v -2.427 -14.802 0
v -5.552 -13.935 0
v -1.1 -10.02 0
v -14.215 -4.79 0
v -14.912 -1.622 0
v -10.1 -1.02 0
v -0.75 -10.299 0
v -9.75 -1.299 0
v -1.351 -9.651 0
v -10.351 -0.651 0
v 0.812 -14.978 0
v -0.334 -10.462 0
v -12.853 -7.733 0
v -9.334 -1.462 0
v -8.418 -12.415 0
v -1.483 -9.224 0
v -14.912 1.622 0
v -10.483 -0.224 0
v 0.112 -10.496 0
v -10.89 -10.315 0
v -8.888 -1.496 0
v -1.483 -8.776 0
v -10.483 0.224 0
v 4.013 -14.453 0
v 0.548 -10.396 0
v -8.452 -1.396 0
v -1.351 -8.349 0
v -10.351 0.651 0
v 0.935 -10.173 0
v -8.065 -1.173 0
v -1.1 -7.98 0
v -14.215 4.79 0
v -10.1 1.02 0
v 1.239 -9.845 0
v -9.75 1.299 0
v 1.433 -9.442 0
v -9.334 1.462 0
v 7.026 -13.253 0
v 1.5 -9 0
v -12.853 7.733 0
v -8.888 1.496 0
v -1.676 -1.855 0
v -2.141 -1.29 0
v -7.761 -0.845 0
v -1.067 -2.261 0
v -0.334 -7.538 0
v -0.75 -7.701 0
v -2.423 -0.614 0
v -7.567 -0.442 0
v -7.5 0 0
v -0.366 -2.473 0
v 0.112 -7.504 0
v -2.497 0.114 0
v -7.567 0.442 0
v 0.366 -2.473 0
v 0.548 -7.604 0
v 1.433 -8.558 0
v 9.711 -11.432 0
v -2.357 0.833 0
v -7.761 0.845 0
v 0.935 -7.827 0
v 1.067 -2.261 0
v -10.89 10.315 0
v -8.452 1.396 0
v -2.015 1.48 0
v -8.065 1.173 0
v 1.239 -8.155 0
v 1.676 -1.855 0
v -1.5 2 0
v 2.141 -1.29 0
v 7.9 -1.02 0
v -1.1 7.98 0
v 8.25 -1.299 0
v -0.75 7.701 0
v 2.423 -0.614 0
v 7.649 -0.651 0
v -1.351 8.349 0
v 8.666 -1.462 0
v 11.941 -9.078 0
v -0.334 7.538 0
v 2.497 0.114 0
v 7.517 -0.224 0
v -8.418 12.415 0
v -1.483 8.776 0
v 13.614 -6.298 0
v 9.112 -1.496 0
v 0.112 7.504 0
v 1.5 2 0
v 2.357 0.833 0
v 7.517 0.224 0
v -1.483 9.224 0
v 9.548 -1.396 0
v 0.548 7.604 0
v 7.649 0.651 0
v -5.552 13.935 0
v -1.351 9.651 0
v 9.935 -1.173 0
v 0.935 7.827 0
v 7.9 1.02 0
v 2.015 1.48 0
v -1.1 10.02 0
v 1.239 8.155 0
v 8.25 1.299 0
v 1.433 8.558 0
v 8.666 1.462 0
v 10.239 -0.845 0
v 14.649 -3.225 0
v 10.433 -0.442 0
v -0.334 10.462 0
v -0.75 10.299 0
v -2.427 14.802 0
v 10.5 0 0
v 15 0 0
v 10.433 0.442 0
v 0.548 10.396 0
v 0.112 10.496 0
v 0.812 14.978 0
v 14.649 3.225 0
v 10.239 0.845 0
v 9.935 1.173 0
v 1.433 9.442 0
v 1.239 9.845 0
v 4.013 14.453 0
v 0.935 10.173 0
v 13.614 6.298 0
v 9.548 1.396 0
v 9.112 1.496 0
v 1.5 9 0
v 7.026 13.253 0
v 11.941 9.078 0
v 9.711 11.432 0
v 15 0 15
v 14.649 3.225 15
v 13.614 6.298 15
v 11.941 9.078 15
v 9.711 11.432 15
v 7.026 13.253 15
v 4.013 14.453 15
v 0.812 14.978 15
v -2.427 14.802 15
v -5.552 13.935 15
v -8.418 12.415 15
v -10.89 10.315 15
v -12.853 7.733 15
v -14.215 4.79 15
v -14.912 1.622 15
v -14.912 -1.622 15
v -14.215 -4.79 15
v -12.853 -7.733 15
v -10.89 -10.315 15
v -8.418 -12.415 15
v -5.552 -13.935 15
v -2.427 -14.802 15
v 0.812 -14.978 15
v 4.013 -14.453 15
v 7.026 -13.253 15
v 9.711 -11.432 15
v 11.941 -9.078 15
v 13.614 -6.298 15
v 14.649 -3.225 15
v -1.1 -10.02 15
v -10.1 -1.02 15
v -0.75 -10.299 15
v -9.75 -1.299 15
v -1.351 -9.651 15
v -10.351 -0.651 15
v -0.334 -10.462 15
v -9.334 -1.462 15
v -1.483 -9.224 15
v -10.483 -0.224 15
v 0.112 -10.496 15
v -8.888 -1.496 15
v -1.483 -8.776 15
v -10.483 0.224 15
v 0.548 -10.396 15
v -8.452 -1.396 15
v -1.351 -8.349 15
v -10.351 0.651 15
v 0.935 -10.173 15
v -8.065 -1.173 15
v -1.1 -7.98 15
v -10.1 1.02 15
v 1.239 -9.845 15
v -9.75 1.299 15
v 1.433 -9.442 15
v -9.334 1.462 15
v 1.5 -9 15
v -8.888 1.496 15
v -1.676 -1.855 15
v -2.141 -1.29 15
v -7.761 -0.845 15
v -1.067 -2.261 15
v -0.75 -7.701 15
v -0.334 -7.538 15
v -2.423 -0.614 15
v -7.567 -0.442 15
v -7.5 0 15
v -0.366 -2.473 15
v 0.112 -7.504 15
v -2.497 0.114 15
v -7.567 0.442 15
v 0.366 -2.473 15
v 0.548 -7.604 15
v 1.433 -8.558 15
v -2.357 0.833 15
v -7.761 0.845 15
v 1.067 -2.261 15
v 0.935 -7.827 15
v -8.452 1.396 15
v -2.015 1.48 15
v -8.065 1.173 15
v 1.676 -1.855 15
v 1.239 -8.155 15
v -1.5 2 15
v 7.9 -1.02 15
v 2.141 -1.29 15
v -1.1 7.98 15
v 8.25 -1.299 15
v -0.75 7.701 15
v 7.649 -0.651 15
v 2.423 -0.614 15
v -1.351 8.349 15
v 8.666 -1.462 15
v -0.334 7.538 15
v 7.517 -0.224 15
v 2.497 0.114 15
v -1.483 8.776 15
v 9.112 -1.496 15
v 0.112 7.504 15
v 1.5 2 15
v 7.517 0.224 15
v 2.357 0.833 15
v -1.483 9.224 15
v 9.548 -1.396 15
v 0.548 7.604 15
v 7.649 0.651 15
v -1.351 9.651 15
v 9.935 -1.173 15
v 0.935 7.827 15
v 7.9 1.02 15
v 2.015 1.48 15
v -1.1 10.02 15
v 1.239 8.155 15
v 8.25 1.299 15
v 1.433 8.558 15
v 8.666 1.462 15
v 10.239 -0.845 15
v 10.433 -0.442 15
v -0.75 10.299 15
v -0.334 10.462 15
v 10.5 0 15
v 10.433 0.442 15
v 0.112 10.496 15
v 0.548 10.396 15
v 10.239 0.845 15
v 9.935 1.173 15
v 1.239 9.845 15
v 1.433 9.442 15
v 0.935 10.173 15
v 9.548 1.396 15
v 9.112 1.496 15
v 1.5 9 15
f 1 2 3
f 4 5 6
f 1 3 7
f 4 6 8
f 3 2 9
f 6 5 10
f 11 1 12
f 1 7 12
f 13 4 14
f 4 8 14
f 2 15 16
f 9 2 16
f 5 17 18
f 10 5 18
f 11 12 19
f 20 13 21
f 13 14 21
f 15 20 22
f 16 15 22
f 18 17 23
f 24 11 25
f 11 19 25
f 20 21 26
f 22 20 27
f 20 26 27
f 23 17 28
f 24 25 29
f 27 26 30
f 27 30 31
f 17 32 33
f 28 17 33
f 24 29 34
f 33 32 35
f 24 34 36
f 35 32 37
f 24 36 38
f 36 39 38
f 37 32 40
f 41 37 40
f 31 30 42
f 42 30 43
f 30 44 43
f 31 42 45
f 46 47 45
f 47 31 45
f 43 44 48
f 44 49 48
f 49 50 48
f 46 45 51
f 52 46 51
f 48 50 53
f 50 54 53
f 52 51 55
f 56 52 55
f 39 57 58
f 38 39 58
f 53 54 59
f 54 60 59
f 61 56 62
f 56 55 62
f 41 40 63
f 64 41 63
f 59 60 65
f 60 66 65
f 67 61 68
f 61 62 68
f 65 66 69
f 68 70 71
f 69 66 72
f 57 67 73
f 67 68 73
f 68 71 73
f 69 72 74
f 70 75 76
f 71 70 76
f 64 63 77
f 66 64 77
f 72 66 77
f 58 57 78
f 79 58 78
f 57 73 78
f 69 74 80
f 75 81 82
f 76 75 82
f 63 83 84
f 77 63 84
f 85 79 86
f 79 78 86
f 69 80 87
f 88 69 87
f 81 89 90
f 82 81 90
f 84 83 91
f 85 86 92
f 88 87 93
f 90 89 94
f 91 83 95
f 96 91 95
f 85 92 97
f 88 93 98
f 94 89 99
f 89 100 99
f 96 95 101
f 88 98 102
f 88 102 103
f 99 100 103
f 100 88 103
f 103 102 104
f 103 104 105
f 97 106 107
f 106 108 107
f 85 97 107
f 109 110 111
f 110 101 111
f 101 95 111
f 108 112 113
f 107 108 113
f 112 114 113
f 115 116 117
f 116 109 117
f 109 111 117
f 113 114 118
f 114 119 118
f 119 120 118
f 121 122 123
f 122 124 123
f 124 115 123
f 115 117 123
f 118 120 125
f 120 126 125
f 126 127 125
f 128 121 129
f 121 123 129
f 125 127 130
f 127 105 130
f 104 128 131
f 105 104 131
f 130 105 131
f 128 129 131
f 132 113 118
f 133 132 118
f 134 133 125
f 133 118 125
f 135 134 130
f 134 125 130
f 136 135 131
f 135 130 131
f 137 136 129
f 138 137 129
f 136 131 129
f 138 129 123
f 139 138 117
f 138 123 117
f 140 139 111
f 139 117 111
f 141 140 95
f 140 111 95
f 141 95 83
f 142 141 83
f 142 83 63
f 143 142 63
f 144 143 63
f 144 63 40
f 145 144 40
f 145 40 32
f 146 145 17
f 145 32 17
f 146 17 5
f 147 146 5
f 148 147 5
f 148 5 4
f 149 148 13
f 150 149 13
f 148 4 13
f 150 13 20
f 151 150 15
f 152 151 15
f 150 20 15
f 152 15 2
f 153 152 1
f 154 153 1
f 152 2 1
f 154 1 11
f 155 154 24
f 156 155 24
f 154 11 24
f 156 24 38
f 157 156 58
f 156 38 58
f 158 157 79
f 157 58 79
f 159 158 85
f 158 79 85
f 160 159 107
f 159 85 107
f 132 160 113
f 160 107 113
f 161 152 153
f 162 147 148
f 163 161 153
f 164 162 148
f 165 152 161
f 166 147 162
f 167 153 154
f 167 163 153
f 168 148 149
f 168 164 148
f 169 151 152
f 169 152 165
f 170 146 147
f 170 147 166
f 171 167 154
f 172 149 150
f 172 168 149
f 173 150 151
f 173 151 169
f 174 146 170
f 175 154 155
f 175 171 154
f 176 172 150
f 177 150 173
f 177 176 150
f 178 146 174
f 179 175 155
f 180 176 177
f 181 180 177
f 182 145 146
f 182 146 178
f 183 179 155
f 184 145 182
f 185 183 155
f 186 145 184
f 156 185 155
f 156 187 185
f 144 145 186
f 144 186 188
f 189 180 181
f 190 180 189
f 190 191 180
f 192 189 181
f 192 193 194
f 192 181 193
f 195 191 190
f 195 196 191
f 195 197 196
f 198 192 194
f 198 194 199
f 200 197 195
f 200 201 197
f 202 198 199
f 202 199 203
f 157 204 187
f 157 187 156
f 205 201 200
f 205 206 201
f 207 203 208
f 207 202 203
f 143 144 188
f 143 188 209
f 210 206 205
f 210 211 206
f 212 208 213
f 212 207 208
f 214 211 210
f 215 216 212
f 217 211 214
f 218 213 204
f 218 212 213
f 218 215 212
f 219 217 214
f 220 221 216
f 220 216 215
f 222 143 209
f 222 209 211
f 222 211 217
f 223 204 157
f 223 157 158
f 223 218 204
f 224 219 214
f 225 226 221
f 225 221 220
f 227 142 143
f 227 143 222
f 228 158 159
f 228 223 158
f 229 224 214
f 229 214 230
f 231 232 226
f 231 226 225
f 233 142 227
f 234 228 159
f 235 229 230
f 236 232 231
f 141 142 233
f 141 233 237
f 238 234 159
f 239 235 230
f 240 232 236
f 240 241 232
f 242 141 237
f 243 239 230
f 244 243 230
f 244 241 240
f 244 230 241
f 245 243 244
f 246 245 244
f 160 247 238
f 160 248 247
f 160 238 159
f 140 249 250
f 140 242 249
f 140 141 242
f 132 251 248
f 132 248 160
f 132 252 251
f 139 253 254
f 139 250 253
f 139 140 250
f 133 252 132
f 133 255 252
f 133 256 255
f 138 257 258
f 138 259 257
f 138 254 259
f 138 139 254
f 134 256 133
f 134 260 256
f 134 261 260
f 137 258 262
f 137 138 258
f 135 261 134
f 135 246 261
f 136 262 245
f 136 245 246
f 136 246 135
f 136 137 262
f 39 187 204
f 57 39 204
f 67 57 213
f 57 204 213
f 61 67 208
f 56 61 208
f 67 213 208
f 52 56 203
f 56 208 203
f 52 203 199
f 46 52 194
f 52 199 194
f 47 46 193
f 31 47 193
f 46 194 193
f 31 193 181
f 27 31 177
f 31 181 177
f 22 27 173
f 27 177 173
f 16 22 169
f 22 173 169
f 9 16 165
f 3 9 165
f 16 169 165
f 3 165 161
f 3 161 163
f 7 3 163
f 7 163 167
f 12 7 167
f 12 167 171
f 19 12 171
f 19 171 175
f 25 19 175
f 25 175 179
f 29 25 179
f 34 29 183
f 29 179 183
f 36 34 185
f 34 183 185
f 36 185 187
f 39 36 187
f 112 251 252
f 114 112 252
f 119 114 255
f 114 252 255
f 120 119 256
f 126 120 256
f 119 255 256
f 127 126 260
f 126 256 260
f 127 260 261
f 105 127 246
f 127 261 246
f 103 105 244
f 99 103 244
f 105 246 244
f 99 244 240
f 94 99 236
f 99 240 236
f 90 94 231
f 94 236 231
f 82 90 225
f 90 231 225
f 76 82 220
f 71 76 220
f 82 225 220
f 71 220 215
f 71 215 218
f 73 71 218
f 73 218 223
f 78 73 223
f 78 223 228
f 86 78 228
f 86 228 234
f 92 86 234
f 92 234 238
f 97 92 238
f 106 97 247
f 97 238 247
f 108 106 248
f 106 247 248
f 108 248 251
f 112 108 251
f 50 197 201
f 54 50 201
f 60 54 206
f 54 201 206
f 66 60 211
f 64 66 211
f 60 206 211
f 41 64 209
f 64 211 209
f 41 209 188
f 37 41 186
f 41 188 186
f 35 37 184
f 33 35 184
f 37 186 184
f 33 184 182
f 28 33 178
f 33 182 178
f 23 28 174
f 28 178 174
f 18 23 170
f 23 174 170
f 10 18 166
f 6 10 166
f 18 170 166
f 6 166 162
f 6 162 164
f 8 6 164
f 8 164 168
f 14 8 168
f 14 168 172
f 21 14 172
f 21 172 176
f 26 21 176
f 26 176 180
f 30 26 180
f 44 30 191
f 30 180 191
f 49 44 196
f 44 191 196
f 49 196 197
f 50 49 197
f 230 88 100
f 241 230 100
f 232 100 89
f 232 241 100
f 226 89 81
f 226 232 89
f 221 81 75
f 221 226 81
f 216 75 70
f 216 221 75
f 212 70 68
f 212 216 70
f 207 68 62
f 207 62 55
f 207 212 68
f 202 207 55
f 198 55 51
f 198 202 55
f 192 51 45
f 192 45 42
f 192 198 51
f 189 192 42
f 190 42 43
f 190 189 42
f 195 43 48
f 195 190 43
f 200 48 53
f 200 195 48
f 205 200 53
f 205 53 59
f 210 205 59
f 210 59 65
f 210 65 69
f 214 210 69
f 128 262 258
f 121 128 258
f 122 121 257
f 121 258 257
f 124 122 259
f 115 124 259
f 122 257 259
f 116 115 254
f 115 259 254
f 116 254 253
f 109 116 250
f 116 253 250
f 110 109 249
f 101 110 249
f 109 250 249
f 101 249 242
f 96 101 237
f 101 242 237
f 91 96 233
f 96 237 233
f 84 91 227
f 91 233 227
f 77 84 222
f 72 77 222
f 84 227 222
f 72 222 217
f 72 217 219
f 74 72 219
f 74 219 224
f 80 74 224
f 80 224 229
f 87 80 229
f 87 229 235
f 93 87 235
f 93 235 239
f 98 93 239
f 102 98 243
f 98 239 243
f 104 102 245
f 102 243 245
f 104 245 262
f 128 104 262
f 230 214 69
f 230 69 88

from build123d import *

# Parameters (mm, degrees)
SKETCH1_R           = 15
BOSS_EXTRUDE1_DEPTH = 15
CUT_EXTRUDE1_DEPTH  = 15
SKETCH3_R           = 1.5
CUT_EXTRUDE2_DEPTH  = 15


with BuildPart() as part:
    # Sketch1 → Boss-Extrude1 (new body)
    with BuildSketch(Plane.XY):
        Circle(SKETCH1_R)
    extrude(amount=BOSS_EXTRUDE1_DEPTH)

    # Sketch2 → Cut-Extrude1 (cut)
    with BuildSketch(Plane.XY.offset(15)):
        with BuildLine():
            Line((-1.5, 2), (1.5, 2))
            ThreePointArc((1.5, 2), (0, -2.5), (-1.5, 2))
        make_face()
    extrude(amount=-CUT_EXTRUDE1_DEPTH, mode=Mode.SUBTRACT)

    # Sketch3 → Cut-Extrude2 (cut)
    with BuildSketch(Plane.XY.offset(15)):
        with Locations((0, 9)):
            Circle(SKETCH3_R)
        with Locations((9, 0)):
            Circle(SKETCH3_R)
        with Locations((0, -9)):
            Circle(SKETCH3_R)
        with Locations((-9, 0)):
            Circle(SKETCH3_R)
    extrude(amount=-CUT_EXTRUDE2_DEPTH, mode=Mode.SUBTRACT)


solid = part.part
